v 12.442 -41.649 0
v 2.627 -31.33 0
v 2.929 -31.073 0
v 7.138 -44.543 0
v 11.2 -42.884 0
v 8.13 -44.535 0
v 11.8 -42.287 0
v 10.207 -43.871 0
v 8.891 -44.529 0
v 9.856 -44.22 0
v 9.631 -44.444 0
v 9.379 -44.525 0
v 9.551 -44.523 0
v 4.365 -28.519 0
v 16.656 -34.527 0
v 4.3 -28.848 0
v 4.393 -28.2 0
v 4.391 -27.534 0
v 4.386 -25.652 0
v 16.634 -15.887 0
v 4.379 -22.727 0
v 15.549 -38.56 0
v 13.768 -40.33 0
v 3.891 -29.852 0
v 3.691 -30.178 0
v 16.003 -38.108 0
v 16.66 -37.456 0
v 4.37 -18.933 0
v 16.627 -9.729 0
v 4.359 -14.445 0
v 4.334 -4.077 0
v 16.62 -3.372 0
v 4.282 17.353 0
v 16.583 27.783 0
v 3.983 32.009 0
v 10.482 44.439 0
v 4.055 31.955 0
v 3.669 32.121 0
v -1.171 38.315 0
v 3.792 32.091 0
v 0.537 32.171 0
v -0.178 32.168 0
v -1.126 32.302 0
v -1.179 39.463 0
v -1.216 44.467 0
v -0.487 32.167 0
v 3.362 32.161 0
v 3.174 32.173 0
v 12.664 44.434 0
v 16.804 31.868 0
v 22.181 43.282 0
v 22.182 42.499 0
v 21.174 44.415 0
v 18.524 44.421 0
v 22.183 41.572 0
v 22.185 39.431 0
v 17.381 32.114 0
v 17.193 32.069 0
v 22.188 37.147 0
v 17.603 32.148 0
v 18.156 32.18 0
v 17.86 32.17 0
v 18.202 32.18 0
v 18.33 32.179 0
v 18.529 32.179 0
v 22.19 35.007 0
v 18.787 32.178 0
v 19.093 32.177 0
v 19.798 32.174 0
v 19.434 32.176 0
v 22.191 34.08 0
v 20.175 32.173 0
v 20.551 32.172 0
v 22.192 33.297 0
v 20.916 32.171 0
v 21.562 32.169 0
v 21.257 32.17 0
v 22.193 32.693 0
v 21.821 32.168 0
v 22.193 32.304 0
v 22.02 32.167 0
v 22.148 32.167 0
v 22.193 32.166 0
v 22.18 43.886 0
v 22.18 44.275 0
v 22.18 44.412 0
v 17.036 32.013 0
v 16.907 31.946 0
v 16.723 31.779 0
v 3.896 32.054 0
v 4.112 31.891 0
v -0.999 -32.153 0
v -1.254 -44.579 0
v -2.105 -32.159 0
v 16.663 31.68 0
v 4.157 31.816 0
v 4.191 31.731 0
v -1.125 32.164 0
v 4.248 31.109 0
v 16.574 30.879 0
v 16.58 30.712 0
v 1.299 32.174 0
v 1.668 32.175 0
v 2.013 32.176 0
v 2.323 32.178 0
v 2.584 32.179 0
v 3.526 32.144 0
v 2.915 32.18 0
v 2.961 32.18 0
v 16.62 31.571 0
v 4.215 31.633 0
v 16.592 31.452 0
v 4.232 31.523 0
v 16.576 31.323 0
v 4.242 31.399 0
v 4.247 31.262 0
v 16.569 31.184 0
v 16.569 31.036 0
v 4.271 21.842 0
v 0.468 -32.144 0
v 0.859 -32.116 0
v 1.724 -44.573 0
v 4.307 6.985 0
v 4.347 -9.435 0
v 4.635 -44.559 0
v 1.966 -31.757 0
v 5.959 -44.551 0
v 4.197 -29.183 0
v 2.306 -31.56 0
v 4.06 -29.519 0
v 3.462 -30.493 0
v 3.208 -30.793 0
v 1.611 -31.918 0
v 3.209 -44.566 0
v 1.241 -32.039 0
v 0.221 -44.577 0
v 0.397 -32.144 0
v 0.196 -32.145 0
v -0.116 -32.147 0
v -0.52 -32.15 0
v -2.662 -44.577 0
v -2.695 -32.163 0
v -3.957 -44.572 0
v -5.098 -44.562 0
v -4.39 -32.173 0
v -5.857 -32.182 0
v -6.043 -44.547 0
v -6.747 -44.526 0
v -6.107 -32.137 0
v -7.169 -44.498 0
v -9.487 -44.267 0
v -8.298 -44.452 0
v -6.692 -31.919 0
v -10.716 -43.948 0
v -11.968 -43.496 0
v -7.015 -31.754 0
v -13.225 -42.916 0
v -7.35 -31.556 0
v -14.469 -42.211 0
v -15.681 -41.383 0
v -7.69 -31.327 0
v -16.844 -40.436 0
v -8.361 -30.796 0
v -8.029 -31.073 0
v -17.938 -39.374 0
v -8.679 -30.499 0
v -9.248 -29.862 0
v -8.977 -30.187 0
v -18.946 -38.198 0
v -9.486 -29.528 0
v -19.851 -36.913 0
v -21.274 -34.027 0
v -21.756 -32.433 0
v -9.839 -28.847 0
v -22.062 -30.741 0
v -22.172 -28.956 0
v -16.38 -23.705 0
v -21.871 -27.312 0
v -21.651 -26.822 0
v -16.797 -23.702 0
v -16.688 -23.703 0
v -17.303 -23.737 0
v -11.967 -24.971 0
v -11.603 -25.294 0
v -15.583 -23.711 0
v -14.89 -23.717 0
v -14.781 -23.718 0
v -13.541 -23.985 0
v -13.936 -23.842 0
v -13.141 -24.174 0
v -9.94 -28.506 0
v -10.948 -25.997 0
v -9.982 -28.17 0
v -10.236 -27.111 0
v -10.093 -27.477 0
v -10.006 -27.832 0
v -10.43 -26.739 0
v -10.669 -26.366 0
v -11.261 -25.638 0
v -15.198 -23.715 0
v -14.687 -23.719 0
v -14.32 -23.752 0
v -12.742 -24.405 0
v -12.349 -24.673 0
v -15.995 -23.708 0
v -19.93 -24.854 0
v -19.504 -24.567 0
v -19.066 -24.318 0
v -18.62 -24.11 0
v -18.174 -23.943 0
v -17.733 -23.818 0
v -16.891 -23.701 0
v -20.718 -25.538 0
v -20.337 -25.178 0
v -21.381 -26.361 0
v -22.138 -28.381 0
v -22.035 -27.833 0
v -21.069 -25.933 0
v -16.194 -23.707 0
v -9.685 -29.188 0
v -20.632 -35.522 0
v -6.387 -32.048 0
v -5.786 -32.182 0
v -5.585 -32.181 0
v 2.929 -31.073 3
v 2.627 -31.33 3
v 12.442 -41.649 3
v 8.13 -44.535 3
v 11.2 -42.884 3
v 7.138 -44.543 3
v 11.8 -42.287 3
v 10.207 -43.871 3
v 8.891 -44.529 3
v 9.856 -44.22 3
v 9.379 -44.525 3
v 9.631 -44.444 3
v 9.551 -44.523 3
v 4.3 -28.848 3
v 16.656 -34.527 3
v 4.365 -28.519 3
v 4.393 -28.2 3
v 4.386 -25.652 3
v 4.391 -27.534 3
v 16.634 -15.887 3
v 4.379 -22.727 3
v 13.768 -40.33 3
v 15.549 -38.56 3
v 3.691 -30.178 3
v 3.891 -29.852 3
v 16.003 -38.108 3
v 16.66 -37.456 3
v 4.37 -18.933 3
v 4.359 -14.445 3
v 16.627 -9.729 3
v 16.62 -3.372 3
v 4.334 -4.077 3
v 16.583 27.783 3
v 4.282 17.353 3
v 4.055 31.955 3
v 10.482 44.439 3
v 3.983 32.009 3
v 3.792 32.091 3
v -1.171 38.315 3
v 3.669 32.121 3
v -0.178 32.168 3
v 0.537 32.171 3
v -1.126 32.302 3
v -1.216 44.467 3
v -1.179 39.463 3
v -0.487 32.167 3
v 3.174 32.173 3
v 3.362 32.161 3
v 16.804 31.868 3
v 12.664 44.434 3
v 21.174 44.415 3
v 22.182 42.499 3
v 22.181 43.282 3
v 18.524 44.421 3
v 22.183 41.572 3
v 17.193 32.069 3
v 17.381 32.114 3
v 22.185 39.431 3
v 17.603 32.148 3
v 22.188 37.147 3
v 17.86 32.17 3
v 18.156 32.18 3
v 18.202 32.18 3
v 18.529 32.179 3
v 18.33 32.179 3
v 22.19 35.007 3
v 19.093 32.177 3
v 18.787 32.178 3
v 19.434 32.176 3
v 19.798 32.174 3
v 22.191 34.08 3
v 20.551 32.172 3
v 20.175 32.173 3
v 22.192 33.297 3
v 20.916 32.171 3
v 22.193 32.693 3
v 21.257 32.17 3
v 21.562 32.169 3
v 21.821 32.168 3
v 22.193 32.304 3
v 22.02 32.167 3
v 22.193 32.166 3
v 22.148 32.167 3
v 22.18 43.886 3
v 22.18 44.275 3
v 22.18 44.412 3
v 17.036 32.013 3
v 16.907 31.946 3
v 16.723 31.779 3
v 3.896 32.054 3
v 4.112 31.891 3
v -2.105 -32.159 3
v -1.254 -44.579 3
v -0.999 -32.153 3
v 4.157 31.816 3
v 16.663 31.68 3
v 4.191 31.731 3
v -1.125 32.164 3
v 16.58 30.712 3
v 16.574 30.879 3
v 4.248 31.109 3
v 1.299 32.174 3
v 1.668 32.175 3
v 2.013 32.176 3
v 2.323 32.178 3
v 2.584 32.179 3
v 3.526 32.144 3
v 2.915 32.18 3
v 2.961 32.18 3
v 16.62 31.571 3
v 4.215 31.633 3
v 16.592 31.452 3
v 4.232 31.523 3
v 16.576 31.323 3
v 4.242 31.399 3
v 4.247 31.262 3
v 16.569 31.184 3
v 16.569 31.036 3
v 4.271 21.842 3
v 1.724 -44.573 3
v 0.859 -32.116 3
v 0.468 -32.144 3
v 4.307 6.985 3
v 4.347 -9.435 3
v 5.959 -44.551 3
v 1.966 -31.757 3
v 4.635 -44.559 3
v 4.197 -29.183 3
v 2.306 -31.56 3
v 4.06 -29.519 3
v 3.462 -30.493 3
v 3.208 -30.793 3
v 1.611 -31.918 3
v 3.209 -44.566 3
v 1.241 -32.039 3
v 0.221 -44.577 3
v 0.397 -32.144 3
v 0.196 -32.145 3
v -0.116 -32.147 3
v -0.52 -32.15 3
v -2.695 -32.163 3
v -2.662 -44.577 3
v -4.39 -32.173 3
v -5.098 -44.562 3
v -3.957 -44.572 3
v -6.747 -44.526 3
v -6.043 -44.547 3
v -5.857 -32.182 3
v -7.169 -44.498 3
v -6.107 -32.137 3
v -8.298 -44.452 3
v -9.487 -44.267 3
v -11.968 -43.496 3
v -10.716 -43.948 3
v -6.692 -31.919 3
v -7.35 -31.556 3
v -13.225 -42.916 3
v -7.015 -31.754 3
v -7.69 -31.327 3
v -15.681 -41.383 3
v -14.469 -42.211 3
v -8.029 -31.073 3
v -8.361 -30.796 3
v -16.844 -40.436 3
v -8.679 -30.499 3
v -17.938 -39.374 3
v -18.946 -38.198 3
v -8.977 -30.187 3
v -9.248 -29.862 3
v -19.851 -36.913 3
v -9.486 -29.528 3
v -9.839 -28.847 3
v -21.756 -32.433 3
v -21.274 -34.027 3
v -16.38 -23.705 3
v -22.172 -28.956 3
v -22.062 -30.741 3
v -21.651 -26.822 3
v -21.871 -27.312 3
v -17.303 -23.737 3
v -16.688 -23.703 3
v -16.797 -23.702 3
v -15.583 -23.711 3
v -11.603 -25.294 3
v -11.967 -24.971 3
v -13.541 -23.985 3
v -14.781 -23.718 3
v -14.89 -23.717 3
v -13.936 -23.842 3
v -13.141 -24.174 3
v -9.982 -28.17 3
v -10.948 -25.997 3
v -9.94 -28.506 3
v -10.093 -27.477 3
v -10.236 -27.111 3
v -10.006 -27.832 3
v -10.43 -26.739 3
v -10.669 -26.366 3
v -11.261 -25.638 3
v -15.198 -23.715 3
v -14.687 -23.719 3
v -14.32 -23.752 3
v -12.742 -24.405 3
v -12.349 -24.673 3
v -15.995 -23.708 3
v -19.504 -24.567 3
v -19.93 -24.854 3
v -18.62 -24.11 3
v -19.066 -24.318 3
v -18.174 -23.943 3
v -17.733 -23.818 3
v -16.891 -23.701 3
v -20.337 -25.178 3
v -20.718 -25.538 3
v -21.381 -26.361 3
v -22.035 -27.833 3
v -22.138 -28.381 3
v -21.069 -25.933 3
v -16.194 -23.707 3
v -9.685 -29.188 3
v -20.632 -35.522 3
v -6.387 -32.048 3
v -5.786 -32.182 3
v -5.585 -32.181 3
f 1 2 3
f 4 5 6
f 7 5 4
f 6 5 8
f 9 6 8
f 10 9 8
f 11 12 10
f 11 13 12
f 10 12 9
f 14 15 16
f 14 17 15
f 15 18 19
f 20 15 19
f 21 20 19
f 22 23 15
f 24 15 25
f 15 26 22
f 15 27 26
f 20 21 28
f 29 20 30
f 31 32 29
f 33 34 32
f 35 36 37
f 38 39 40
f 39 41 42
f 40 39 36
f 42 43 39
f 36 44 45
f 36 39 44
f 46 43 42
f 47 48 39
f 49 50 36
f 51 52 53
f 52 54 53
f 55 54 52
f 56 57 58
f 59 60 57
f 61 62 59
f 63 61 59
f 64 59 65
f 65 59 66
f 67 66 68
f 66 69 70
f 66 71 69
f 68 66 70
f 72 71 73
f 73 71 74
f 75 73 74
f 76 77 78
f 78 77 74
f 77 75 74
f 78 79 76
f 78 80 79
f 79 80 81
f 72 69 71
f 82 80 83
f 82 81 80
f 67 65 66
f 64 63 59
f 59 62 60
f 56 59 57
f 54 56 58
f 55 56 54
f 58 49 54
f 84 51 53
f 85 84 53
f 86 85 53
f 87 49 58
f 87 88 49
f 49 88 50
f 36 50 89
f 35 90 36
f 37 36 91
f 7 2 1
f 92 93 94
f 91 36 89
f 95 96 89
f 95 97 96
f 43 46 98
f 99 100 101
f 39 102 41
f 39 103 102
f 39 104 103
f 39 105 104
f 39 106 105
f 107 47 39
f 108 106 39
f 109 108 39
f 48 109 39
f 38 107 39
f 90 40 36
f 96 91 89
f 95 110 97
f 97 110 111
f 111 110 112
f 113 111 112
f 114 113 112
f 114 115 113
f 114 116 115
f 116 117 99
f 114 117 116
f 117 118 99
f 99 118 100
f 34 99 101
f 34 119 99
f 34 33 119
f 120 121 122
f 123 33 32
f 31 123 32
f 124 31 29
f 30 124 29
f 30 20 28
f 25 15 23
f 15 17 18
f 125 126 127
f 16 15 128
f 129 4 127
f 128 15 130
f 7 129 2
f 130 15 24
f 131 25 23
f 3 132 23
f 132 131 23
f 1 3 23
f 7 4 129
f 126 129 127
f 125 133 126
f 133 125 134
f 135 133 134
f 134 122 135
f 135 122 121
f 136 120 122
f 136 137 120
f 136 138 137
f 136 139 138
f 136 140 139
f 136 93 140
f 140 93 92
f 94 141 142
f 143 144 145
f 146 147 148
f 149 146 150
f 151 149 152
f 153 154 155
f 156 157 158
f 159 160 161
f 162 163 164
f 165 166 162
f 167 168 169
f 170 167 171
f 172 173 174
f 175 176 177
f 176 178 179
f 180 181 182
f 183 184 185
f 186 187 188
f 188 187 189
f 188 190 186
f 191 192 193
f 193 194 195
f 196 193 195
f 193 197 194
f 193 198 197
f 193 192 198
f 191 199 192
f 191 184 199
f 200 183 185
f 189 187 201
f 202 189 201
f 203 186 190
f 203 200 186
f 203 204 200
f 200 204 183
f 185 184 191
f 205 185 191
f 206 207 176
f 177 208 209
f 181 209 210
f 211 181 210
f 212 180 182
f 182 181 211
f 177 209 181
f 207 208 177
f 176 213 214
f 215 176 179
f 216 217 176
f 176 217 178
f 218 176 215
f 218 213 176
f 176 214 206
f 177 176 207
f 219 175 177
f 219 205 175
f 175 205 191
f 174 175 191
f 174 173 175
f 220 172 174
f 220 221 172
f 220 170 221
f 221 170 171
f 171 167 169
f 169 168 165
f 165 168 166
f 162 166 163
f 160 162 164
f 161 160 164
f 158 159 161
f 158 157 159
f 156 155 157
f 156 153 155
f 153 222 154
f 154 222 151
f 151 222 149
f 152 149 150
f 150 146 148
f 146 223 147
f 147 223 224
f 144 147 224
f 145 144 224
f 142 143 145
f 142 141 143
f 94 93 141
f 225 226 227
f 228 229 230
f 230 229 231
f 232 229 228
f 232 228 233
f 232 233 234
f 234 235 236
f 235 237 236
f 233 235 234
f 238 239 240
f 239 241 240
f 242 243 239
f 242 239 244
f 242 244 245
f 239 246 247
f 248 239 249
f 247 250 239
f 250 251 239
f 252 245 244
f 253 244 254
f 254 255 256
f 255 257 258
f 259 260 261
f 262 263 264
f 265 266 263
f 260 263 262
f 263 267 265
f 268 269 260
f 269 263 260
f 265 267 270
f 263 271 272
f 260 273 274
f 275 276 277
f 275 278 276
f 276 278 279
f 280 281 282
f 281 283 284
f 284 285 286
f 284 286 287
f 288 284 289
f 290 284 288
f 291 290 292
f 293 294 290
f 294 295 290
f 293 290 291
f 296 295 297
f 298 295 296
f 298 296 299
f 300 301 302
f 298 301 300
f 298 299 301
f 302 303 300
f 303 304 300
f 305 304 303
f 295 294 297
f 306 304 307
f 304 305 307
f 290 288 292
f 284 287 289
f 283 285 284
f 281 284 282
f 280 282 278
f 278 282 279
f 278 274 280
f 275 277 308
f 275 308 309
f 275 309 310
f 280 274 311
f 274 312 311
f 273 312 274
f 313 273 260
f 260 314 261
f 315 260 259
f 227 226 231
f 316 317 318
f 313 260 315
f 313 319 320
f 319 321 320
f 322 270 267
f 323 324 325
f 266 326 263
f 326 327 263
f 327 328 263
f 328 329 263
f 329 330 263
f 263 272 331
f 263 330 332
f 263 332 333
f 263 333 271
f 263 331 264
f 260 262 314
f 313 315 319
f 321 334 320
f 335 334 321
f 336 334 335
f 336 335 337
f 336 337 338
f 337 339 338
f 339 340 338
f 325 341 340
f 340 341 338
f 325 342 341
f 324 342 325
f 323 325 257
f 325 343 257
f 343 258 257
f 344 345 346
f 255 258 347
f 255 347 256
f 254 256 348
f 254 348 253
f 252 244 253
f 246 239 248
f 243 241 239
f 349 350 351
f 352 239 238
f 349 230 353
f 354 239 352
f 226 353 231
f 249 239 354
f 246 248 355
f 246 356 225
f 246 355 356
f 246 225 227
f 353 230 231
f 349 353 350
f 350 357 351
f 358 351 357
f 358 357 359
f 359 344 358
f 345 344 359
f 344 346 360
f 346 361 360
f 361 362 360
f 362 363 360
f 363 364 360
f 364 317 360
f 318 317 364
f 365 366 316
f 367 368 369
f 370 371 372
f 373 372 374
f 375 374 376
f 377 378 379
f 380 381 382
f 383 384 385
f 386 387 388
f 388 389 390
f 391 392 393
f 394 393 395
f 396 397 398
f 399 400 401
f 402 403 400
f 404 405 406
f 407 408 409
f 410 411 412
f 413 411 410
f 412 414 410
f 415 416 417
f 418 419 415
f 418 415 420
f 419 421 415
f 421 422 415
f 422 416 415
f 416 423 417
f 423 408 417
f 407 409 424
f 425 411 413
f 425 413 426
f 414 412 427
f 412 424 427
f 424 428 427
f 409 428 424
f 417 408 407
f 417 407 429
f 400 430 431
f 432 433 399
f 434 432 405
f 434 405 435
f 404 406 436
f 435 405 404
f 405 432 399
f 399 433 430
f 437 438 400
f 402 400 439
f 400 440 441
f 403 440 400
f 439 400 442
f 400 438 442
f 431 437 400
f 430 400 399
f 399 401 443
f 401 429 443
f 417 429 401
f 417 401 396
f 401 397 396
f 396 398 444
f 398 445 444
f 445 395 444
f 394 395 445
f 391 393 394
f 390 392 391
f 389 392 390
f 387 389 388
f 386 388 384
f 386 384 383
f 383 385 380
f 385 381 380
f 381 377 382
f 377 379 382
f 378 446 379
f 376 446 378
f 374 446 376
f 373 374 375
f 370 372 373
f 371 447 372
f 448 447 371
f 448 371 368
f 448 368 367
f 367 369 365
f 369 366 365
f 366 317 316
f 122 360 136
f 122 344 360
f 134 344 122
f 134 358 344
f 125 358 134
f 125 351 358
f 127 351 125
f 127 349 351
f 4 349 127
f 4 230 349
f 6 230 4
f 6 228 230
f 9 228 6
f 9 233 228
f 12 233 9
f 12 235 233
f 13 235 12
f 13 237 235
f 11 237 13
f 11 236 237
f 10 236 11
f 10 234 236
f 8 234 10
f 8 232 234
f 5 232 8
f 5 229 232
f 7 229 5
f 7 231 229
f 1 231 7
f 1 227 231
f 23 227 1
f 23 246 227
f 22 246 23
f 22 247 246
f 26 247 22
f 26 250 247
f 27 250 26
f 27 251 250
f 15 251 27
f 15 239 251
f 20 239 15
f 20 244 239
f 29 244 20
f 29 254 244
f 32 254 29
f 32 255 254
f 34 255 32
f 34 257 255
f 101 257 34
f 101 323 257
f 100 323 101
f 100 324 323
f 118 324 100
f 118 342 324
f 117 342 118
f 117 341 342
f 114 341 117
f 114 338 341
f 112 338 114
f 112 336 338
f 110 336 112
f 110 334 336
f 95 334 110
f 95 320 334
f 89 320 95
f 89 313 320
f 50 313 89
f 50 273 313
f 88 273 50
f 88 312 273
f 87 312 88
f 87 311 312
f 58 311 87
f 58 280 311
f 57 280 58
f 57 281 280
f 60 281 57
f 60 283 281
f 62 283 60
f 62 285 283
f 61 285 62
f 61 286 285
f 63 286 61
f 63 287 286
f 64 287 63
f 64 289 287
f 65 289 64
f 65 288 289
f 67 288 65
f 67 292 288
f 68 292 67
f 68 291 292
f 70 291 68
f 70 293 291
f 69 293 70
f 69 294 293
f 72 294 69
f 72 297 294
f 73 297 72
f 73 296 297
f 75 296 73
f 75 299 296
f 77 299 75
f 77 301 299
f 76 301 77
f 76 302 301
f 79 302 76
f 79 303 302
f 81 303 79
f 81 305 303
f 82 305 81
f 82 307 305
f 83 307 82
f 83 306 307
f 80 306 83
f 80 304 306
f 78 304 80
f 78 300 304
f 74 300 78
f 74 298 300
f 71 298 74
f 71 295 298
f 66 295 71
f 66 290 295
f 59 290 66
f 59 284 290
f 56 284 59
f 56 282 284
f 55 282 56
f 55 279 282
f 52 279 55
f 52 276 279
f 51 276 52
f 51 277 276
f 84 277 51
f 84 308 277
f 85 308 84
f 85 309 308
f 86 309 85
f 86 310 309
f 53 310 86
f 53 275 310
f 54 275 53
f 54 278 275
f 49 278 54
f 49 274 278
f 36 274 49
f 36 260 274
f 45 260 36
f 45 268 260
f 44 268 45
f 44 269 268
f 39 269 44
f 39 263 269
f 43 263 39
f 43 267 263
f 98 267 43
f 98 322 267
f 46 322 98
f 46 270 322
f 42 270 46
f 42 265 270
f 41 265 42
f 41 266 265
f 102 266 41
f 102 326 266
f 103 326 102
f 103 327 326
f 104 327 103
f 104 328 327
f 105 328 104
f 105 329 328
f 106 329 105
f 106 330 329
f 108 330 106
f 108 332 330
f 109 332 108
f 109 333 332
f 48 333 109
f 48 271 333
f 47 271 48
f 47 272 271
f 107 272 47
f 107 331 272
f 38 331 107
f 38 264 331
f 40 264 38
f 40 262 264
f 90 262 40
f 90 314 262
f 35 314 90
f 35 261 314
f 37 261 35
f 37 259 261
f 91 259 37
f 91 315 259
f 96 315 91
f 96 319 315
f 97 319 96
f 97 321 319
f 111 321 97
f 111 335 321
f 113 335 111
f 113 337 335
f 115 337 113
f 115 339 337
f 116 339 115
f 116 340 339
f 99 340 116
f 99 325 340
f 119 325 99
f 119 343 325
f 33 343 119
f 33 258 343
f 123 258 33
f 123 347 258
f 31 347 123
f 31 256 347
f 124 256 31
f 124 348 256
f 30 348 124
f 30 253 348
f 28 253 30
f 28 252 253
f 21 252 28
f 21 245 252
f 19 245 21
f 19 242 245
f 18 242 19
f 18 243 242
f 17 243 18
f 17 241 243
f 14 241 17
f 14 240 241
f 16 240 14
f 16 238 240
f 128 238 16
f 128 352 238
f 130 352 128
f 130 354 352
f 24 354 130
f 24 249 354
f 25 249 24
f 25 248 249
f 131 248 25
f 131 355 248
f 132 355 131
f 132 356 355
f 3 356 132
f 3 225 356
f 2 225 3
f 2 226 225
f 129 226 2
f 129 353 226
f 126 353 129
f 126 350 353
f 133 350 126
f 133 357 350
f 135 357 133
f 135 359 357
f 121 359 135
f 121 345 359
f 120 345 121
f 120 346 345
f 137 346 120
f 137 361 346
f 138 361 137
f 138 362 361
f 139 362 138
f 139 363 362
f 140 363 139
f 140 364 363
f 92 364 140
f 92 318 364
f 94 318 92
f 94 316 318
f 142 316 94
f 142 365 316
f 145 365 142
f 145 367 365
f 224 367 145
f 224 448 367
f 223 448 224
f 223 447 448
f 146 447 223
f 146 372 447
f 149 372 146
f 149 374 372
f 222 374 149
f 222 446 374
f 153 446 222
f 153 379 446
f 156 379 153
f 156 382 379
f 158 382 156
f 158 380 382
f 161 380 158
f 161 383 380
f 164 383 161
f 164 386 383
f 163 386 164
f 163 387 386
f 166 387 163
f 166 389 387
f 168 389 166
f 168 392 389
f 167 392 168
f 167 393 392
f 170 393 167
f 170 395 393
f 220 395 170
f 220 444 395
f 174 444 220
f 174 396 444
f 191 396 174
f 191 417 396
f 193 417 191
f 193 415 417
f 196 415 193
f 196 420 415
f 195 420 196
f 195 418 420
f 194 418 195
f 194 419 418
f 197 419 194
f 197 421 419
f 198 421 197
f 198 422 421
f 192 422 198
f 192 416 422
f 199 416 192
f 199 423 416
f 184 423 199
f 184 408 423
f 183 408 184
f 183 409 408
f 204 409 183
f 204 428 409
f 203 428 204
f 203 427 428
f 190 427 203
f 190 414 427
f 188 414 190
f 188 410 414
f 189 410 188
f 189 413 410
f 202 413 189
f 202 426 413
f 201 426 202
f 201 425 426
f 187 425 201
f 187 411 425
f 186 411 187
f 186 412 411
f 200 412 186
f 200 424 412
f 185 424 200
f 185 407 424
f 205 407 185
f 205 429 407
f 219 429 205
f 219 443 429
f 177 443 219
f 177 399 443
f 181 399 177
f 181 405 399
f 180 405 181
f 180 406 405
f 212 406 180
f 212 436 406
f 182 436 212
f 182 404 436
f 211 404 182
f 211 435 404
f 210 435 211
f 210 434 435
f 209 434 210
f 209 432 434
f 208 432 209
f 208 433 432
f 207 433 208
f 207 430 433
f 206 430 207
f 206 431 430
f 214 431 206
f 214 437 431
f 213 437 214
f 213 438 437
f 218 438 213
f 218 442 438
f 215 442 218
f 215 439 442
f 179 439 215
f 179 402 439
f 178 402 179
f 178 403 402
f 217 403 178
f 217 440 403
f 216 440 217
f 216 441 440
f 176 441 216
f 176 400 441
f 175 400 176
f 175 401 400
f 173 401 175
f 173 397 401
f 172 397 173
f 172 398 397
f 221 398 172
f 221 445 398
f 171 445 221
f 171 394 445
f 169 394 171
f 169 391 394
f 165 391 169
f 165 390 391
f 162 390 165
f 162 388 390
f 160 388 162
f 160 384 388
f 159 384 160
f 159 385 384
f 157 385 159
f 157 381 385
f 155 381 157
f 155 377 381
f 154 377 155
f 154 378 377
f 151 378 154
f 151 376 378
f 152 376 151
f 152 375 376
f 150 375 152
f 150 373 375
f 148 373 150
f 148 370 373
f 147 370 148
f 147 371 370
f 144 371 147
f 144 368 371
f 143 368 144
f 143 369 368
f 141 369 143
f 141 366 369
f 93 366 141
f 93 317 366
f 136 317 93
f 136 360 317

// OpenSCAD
// Generated from 交通部公路局（原交通部公路總局）「新式號牌使用之英文字、數字字體」author trace
fudge = 0.1;

module glyph_2012_J(h = 3) {
  difference() {
    linear_extrude(height = h)
      polygon(points = [[-1.2163, 44.4667], [-1.2153, 44.3285], [-1.2124, 43.9381], [-1.2079, 43.3314], [-1.2021, 42.5444], [-1.1952, 41.6133], [-1.1875, 40.5741], [-1.1793, 39.4628], [-1.1709, 38.3154], [-1.1624, 37.1681], [-1.1542, 36.0568], [-1.1465, 35.0175], [-1.1396, 34.0864], [-1.1338, 33.2995], [-1.1293, 32.6928], [-1.1264, 32.3023], [-1.1254, 32.1641], [-1.0795, 32.1643], [-0.9498, 32.1648], [-0.7483, 32.1656], [-0.4869, 32.1666], [-0.1776, 32.1679], [0.1677, 32.1692], [0.5368, 32.1706], [0.918, 32.1721], [1.2991, 32.1736], [1.6683, 32.1751], [2.0135, 32.1764], [2.3228, 32.1776], [2.5842, 32.1787], [2.7857, 32.1795], [2.9154, 32.18], [2.9613, 32.1801], [3.1738, 32.1727], [3.3616, 32.1609], [3.5262, 32.1438], [3.6692, 32.1209], [3.792, 32.0913], [3.8962, 32.0542], [3.9832, 32.0089], [4.0547, 31.9547], [4.1122, 31.8909], [4.1571, 31.8165], [4.1909, 31.731], [4.2153, 31.6334], [4.2317, 31.5232], [4.2417, 31.3995], [4.2467, 31.2616], [4.2483, 31.1087], [4.2499, 30.4427], [4.2545, 28.5603], [4.2616, 25.6354], [4.2708, 21.8417], [4.2818, 17.353], [4.294, 12.343], [4.307, 6.9855], [4.3205, 1.4542], [4.334, -4.0771], [4.347, -9.4346], [4.3592, -14.4446], [4.3701, -18.9333], [4.3794, -22.727], [4.3865, -25.6519], [4.3911, -27.5343], [4.3927, -28.2003], [4.3655, -28.5195], [4.2996, -28.8484], [4.1972, -29.1828], [4.0602, -29.5187], [3.8907, -29.8518], [3.6907, -30.178], [3.4624, -30.4931], [3.2077, -30.793], [2.9287, -31.0735], [2.6275, -31.3304], [2.3061, -31.5596], [1.9665, -31.7569], [1.6109, -31.9181], [1.2412, -32.0391], [0.8595, -32.1157], [0.4679, -32.1438], [0.3969, -32.1442], [0.1961, -32.1455], [-0.1158, -32.1474], [-0.5204, -32.1498], [-0.9991, -32.1527], [-1.5334, -32.156], [-2.1047, -32.1595], [-2.6946, -32.163], [-3.2845, -32.1666], [-3.8559, -32.1701], [-4.3902, -32.1734], [-4.8689, -32.1763], [-5.2734, -32.1787], [-5.5854, -32.1806], [-5.7861, -32.1819], [-5.8572, -32.1823], [-6.1066, -32.1369], [-6.3869, -32.0481], [-6.6918, -31.9194], [-7.0149, -31.7541], [-7.3498, -31.5556], [-7.69, -31.3275], [-8.0292, -31.0732], [-8.361, -30.796], [-8.679, -30.4995], [-8.9769, -30.187], [-9.2481, -29.8621], [-9.4865, -29.5281], [-9.6854, -29.1885], [-9.8387, -28.8466], [-9.9398, -28.5061], [-9.9824, -28.1702], [-10.0065, -27.8321], [-10.0928, -27.4774], [-10.2357, -27.1112], [-10.4296, -26.7389], [-10.6689, -26.3658], [-10.9479, -25.9971], [-11.261, -25.6381], [-11.6026, -25.2942], [-11.967, -24.9706], [-12.3488, -24.6726], [-12.7421, -24.4054], [-13.1415, -24.1745], [-13.5413, -23.9851], [-13.9359, -23.8424], [-14.3196, -23.7518], [-14.6868, -23.7186], [-14.7116, -23.7184], [-14.7815, -23.7178], [-14.8903, -23.717], [-15.0313, -23.7159], [-15.1981, -23.7146], [-15.3843, -23.7131], [-15.5835, -23.7115], [-15.7891, -23.7099], [-15.9947, -23.7083], [-16.1938, -23.7068], [-16.38, -23.7053], [-16.5469, -23.704], [-16.6879, -23.7029], [-16.7966, -23.702], [-16.8666, -23.7015], [-16.8913, -23.7013], [-17.3034, -23.737], [-17.7329, -23.8179], [-18.1739, -23.9426], [-18.6202, -24.1099], [-19.0658, -24.3184], [-19.5045, -24.5669], [-19.9302, -24.8539], [-20.3368, -25.1781], [-20.7183, -25.5384], [-21.0686, -25.9332], [-21.3815, -26.3614], [-21.651, -26.8216], [-21.8709, -27.3125], [-22.0351, -27.8327], [-22.1376, -28.381], [-22.1723, -28.9561], [-22.0618, -30.7412], [-21.7561, -32.4327], [-21.2736, -34.0273], [-20.6324, -35.5219], [-19.8507, -36.9133], [-18.9465, -38.1983], [-17.9381, -39.3737], [-16.8437, -40.4364], [-15.6813, -41.3832], [-14.4692, -42.2109], [-13.2255, -42.9163], [-11.9684, -43.4962], [-10.716, -43.9476], [-9.4866, -44.2671], [-8.2982, -44.4517], [-7.169, -44.4981], [-6.7471, -44.5256], [-6.0427, -44.5466], [-5.0985, -44.5617], [-3.9572, -44.5717], [-2.6616, -44.5771], [-1.2545, -44.5786], [0.2215, -44.5769], [1.7236, -44.5726], [3.2091, -44.5664], [4.6351, -44.5588], [5.9591, -44.5507], [7.1381, -44.5426], [8.1296, -44.5351], [8.8907, -44.529], [9.3787, -44.5248], [9.5508, -44.5233], [9.6307, -44.4439], [9.8563, -44.2196], [10.2069, -43.8711], [10.6616, -43.419], [11.1996, -42.8841], [11.8001, -42.2871], [12.4422, -41.6486], [13.1052, -40.9895], [13.7682, -40.3304], [14.4103, -39.692], [15.0108, -39.0949], [15.5488, -38.56], [16.0035, -38.108], [16.3541, -37.7594], [16.5797, -37.5351], [16.6596, -37.4557], [16.6587, -36.6902], [16.6561, -34.5266], [16.6522, -31.1648], [16.6471, -26.8045], [16.6411, -21.6453], [16.6344, -15.887], [16.6272, -9.7292], [16.6197, -3.3718], [16.6123, 2.9857], [16.6051, 9.1435], [16.5984, 14.9018], [16.5924, 20.061], [16.5873, 24.4213], [16.5834, 27.7831], [16.5808, 29.9467], [16.5799, 30.7122], [16.574, 30.8787], [16.5695, 31.036], [16.5691, 31.1842], [16.5756, 31.3229], [16.5916, 31.452], [16.6198, 31.5712], [16.6627, 31.6804], [16.7232, 31.7794], [16.8038, 31.868], [16.9072, 31.946], [17.0362, 32.0131], [17.1933, 32.0693], [17.3812, 32.1143], [17.6026, 32.1479], [17.8602, 32.1699], [18.1565, 32.1801], [18.2019, 32.1799], [18.33, 32.1795], [18.5291, 32.1788], [18.7873, 32.178], [19.0928, 32.1769], [19.4338, 32.1758], [19.7984, 32.1745], [20.1749, 32.1733], [20.5513, 32.172], [20.916, 32.1708], [21.257, 32.1696], [21.5625, 32.1686], [21.8207, 32.1677], [22.0197, 32.1671], [22.1479, 32.1666], [22.1932, 32.1665], [22.193, 32.304], [22.1926, 32.6927], [22.1919, 33.2966], [22.1911, 34.0799], [22.19, 35.0067], [22.1889, 36.0412], [22.1877, 37.1473], [22.1864, 38.2894], [22.1851, 39.4315], [22.1839, 40.5377], [22.1828, 41.5721], [22.1817, 42.4989], [22.1809, 43.2822], [22.1802, 43.8862], [22.1798, 44.2748], [22.1796, 44.4124], [21.9169, 44.413], [21.1743, 44.4147], [20.0205, 44.4174], [18.524, 44.4209], [16.7533, 44.425], [14.777, 44.4296], [12.6636, 44.4345], [10.4817, 44.4395], [8.2997, 44.4446], [6.1863, 44.4495], [4.21, 44.4541], [2.4393, 44.4582], [0.9428, 44.4617], [-0.211, 44.4644], [-0.9535, 44.4661]]);
  }
}

glyph_2012_J();
